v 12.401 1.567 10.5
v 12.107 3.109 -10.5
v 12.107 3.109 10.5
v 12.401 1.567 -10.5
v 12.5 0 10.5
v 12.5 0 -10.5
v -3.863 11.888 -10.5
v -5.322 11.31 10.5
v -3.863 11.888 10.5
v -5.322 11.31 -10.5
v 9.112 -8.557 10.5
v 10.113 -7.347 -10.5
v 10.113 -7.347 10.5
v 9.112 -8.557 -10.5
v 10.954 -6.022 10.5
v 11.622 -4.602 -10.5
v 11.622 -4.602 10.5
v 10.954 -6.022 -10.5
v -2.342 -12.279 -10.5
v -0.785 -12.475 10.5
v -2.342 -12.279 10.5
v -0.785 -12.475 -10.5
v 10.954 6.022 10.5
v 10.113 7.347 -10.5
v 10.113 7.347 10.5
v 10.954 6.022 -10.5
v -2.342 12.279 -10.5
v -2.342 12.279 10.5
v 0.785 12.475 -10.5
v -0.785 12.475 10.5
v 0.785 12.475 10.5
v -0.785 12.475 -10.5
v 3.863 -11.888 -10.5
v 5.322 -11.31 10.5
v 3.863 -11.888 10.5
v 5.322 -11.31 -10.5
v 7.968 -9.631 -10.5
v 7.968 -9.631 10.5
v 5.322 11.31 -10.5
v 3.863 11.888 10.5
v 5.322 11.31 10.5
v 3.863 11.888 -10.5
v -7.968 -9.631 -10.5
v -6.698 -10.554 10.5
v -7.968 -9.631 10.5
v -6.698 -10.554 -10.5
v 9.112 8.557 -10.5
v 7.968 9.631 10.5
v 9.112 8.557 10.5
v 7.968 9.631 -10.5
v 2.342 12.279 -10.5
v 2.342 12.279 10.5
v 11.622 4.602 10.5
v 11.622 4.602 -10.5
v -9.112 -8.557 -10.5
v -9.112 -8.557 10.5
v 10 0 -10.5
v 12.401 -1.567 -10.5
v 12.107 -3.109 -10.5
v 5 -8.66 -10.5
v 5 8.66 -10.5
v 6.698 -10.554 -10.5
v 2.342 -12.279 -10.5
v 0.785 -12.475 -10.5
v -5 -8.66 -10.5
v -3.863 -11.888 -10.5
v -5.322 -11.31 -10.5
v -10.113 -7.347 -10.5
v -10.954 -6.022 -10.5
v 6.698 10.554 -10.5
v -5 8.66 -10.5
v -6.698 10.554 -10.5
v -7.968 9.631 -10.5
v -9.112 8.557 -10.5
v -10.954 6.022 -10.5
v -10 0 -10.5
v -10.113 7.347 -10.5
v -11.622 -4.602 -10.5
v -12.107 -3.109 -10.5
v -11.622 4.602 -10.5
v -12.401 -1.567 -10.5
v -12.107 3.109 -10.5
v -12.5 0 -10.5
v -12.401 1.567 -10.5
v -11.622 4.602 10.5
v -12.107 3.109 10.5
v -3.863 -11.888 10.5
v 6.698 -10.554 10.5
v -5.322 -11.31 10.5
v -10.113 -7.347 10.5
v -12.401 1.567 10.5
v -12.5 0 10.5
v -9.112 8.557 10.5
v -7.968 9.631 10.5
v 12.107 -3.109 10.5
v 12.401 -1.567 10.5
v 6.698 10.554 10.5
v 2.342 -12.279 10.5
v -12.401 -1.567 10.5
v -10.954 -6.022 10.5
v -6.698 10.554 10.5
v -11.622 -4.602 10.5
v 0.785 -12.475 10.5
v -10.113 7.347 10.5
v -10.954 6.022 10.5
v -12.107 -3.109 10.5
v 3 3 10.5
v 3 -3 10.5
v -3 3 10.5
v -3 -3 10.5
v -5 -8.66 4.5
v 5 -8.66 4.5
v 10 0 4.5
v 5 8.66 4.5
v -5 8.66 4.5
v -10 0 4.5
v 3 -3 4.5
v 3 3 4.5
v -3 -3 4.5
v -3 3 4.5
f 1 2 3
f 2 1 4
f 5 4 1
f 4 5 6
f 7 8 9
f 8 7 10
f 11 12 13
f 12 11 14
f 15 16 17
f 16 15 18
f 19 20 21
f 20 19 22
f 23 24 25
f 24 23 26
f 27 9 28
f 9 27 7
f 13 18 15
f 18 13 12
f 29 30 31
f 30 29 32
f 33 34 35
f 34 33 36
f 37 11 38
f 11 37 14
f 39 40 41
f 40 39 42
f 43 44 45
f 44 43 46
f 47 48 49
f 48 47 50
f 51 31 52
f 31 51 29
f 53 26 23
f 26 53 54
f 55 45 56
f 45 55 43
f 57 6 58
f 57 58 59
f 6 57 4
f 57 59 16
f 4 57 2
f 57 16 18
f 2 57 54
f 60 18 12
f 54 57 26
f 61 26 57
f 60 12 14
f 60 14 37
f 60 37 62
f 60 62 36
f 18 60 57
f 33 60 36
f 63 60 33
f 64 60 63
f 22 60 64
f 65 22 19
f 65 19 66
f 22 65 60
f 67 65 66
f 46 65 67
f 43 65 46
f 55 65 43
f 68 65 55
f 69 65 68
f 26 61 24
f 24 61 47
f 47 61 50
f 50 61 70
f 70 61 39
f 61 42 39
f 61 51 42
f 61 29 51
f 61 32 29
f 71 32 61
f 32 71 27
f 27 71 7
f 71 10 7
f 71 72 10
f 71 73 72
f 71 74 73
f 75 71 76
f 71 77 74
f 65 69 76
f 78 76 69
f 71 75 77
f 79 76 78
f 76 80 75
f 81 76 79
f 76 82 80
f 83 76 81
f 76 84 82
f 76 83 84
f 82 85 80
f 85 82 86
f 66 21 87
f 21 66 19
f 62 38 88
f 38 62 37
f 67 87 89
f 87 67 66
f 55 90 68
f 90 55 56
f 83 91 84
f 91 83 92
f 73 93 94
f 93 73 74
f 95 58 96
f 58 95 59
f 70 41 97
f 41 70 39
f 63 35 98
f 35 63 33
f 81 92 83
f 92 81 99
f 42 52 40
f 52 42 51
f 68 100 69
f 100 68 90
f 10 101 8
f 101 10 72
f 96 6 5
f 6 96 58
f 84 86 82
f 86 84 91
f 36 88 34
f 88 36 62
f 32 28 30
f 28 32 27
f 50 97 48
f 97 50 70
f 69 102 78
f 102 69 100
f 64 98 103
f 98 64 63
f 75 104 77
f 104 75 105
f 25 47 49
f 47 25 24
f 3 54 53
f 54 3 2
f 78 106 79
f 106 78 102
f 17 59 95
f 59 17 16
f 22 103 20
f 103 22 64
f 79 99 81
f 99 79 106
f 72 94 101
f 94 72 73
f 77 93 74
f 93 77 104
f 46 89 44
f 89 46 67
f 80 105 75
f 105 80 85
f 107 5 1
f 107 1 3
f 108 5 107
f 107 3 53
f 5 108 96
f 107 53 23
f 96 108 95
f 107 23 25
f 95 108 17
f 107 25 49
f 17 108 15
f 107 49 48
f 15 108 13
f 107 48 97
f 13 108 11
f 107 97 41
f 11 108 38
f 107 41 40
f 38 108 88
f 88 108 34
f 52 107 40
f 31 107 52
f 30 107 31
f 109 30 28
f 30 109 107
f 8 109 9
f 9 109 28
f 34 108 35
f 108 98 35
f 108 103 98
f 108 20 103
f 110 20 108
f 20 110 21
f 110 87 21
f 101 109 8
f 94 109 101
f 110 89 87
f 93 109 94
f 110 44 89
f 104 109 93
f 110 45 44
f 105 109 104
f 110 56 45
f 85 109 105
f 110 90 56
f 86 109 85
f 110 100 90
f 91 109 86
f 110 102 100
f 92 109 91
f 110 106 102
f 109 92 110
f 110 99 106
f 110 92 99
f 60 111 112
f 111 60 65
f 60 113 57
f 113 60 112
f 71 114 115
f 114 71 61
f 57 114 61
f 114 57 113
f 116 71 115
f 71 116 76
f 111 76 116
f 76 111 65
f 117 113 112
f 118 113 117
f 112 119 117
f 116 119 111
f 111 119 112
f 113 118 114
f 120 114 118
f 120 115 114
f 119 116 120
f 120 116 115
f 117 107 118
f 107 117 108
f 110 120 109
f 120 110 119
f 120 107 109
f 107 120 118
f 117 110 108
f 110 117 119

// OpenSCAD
//Hex bolt socket design
//Measuremesnts in mm'

//Ratchet sqaure drive size
S=6;

// Socket Depth
D=15;

// Fastener Head size
H=10;

//Resolution of outer socket layer 
$fn=50;


   module Socket(){
 difference(){
 difference(){
 //Socket outer body
cylinder(h=D+S, r=1.25*H, center=true);
 //Socket inner hex
translate (v=[0,0,-(S/2)-(D/2)]) cylinder($fn=6,h=D, r=H, center=false);     
     //Head and cap
 }
 //Remove square for ratchet drive
  translate (v=[-(S/2),-(S/2),(D/2)-(S/2)]) cube([S,S,S+1],center=false);          
 }} 
      Socket();
